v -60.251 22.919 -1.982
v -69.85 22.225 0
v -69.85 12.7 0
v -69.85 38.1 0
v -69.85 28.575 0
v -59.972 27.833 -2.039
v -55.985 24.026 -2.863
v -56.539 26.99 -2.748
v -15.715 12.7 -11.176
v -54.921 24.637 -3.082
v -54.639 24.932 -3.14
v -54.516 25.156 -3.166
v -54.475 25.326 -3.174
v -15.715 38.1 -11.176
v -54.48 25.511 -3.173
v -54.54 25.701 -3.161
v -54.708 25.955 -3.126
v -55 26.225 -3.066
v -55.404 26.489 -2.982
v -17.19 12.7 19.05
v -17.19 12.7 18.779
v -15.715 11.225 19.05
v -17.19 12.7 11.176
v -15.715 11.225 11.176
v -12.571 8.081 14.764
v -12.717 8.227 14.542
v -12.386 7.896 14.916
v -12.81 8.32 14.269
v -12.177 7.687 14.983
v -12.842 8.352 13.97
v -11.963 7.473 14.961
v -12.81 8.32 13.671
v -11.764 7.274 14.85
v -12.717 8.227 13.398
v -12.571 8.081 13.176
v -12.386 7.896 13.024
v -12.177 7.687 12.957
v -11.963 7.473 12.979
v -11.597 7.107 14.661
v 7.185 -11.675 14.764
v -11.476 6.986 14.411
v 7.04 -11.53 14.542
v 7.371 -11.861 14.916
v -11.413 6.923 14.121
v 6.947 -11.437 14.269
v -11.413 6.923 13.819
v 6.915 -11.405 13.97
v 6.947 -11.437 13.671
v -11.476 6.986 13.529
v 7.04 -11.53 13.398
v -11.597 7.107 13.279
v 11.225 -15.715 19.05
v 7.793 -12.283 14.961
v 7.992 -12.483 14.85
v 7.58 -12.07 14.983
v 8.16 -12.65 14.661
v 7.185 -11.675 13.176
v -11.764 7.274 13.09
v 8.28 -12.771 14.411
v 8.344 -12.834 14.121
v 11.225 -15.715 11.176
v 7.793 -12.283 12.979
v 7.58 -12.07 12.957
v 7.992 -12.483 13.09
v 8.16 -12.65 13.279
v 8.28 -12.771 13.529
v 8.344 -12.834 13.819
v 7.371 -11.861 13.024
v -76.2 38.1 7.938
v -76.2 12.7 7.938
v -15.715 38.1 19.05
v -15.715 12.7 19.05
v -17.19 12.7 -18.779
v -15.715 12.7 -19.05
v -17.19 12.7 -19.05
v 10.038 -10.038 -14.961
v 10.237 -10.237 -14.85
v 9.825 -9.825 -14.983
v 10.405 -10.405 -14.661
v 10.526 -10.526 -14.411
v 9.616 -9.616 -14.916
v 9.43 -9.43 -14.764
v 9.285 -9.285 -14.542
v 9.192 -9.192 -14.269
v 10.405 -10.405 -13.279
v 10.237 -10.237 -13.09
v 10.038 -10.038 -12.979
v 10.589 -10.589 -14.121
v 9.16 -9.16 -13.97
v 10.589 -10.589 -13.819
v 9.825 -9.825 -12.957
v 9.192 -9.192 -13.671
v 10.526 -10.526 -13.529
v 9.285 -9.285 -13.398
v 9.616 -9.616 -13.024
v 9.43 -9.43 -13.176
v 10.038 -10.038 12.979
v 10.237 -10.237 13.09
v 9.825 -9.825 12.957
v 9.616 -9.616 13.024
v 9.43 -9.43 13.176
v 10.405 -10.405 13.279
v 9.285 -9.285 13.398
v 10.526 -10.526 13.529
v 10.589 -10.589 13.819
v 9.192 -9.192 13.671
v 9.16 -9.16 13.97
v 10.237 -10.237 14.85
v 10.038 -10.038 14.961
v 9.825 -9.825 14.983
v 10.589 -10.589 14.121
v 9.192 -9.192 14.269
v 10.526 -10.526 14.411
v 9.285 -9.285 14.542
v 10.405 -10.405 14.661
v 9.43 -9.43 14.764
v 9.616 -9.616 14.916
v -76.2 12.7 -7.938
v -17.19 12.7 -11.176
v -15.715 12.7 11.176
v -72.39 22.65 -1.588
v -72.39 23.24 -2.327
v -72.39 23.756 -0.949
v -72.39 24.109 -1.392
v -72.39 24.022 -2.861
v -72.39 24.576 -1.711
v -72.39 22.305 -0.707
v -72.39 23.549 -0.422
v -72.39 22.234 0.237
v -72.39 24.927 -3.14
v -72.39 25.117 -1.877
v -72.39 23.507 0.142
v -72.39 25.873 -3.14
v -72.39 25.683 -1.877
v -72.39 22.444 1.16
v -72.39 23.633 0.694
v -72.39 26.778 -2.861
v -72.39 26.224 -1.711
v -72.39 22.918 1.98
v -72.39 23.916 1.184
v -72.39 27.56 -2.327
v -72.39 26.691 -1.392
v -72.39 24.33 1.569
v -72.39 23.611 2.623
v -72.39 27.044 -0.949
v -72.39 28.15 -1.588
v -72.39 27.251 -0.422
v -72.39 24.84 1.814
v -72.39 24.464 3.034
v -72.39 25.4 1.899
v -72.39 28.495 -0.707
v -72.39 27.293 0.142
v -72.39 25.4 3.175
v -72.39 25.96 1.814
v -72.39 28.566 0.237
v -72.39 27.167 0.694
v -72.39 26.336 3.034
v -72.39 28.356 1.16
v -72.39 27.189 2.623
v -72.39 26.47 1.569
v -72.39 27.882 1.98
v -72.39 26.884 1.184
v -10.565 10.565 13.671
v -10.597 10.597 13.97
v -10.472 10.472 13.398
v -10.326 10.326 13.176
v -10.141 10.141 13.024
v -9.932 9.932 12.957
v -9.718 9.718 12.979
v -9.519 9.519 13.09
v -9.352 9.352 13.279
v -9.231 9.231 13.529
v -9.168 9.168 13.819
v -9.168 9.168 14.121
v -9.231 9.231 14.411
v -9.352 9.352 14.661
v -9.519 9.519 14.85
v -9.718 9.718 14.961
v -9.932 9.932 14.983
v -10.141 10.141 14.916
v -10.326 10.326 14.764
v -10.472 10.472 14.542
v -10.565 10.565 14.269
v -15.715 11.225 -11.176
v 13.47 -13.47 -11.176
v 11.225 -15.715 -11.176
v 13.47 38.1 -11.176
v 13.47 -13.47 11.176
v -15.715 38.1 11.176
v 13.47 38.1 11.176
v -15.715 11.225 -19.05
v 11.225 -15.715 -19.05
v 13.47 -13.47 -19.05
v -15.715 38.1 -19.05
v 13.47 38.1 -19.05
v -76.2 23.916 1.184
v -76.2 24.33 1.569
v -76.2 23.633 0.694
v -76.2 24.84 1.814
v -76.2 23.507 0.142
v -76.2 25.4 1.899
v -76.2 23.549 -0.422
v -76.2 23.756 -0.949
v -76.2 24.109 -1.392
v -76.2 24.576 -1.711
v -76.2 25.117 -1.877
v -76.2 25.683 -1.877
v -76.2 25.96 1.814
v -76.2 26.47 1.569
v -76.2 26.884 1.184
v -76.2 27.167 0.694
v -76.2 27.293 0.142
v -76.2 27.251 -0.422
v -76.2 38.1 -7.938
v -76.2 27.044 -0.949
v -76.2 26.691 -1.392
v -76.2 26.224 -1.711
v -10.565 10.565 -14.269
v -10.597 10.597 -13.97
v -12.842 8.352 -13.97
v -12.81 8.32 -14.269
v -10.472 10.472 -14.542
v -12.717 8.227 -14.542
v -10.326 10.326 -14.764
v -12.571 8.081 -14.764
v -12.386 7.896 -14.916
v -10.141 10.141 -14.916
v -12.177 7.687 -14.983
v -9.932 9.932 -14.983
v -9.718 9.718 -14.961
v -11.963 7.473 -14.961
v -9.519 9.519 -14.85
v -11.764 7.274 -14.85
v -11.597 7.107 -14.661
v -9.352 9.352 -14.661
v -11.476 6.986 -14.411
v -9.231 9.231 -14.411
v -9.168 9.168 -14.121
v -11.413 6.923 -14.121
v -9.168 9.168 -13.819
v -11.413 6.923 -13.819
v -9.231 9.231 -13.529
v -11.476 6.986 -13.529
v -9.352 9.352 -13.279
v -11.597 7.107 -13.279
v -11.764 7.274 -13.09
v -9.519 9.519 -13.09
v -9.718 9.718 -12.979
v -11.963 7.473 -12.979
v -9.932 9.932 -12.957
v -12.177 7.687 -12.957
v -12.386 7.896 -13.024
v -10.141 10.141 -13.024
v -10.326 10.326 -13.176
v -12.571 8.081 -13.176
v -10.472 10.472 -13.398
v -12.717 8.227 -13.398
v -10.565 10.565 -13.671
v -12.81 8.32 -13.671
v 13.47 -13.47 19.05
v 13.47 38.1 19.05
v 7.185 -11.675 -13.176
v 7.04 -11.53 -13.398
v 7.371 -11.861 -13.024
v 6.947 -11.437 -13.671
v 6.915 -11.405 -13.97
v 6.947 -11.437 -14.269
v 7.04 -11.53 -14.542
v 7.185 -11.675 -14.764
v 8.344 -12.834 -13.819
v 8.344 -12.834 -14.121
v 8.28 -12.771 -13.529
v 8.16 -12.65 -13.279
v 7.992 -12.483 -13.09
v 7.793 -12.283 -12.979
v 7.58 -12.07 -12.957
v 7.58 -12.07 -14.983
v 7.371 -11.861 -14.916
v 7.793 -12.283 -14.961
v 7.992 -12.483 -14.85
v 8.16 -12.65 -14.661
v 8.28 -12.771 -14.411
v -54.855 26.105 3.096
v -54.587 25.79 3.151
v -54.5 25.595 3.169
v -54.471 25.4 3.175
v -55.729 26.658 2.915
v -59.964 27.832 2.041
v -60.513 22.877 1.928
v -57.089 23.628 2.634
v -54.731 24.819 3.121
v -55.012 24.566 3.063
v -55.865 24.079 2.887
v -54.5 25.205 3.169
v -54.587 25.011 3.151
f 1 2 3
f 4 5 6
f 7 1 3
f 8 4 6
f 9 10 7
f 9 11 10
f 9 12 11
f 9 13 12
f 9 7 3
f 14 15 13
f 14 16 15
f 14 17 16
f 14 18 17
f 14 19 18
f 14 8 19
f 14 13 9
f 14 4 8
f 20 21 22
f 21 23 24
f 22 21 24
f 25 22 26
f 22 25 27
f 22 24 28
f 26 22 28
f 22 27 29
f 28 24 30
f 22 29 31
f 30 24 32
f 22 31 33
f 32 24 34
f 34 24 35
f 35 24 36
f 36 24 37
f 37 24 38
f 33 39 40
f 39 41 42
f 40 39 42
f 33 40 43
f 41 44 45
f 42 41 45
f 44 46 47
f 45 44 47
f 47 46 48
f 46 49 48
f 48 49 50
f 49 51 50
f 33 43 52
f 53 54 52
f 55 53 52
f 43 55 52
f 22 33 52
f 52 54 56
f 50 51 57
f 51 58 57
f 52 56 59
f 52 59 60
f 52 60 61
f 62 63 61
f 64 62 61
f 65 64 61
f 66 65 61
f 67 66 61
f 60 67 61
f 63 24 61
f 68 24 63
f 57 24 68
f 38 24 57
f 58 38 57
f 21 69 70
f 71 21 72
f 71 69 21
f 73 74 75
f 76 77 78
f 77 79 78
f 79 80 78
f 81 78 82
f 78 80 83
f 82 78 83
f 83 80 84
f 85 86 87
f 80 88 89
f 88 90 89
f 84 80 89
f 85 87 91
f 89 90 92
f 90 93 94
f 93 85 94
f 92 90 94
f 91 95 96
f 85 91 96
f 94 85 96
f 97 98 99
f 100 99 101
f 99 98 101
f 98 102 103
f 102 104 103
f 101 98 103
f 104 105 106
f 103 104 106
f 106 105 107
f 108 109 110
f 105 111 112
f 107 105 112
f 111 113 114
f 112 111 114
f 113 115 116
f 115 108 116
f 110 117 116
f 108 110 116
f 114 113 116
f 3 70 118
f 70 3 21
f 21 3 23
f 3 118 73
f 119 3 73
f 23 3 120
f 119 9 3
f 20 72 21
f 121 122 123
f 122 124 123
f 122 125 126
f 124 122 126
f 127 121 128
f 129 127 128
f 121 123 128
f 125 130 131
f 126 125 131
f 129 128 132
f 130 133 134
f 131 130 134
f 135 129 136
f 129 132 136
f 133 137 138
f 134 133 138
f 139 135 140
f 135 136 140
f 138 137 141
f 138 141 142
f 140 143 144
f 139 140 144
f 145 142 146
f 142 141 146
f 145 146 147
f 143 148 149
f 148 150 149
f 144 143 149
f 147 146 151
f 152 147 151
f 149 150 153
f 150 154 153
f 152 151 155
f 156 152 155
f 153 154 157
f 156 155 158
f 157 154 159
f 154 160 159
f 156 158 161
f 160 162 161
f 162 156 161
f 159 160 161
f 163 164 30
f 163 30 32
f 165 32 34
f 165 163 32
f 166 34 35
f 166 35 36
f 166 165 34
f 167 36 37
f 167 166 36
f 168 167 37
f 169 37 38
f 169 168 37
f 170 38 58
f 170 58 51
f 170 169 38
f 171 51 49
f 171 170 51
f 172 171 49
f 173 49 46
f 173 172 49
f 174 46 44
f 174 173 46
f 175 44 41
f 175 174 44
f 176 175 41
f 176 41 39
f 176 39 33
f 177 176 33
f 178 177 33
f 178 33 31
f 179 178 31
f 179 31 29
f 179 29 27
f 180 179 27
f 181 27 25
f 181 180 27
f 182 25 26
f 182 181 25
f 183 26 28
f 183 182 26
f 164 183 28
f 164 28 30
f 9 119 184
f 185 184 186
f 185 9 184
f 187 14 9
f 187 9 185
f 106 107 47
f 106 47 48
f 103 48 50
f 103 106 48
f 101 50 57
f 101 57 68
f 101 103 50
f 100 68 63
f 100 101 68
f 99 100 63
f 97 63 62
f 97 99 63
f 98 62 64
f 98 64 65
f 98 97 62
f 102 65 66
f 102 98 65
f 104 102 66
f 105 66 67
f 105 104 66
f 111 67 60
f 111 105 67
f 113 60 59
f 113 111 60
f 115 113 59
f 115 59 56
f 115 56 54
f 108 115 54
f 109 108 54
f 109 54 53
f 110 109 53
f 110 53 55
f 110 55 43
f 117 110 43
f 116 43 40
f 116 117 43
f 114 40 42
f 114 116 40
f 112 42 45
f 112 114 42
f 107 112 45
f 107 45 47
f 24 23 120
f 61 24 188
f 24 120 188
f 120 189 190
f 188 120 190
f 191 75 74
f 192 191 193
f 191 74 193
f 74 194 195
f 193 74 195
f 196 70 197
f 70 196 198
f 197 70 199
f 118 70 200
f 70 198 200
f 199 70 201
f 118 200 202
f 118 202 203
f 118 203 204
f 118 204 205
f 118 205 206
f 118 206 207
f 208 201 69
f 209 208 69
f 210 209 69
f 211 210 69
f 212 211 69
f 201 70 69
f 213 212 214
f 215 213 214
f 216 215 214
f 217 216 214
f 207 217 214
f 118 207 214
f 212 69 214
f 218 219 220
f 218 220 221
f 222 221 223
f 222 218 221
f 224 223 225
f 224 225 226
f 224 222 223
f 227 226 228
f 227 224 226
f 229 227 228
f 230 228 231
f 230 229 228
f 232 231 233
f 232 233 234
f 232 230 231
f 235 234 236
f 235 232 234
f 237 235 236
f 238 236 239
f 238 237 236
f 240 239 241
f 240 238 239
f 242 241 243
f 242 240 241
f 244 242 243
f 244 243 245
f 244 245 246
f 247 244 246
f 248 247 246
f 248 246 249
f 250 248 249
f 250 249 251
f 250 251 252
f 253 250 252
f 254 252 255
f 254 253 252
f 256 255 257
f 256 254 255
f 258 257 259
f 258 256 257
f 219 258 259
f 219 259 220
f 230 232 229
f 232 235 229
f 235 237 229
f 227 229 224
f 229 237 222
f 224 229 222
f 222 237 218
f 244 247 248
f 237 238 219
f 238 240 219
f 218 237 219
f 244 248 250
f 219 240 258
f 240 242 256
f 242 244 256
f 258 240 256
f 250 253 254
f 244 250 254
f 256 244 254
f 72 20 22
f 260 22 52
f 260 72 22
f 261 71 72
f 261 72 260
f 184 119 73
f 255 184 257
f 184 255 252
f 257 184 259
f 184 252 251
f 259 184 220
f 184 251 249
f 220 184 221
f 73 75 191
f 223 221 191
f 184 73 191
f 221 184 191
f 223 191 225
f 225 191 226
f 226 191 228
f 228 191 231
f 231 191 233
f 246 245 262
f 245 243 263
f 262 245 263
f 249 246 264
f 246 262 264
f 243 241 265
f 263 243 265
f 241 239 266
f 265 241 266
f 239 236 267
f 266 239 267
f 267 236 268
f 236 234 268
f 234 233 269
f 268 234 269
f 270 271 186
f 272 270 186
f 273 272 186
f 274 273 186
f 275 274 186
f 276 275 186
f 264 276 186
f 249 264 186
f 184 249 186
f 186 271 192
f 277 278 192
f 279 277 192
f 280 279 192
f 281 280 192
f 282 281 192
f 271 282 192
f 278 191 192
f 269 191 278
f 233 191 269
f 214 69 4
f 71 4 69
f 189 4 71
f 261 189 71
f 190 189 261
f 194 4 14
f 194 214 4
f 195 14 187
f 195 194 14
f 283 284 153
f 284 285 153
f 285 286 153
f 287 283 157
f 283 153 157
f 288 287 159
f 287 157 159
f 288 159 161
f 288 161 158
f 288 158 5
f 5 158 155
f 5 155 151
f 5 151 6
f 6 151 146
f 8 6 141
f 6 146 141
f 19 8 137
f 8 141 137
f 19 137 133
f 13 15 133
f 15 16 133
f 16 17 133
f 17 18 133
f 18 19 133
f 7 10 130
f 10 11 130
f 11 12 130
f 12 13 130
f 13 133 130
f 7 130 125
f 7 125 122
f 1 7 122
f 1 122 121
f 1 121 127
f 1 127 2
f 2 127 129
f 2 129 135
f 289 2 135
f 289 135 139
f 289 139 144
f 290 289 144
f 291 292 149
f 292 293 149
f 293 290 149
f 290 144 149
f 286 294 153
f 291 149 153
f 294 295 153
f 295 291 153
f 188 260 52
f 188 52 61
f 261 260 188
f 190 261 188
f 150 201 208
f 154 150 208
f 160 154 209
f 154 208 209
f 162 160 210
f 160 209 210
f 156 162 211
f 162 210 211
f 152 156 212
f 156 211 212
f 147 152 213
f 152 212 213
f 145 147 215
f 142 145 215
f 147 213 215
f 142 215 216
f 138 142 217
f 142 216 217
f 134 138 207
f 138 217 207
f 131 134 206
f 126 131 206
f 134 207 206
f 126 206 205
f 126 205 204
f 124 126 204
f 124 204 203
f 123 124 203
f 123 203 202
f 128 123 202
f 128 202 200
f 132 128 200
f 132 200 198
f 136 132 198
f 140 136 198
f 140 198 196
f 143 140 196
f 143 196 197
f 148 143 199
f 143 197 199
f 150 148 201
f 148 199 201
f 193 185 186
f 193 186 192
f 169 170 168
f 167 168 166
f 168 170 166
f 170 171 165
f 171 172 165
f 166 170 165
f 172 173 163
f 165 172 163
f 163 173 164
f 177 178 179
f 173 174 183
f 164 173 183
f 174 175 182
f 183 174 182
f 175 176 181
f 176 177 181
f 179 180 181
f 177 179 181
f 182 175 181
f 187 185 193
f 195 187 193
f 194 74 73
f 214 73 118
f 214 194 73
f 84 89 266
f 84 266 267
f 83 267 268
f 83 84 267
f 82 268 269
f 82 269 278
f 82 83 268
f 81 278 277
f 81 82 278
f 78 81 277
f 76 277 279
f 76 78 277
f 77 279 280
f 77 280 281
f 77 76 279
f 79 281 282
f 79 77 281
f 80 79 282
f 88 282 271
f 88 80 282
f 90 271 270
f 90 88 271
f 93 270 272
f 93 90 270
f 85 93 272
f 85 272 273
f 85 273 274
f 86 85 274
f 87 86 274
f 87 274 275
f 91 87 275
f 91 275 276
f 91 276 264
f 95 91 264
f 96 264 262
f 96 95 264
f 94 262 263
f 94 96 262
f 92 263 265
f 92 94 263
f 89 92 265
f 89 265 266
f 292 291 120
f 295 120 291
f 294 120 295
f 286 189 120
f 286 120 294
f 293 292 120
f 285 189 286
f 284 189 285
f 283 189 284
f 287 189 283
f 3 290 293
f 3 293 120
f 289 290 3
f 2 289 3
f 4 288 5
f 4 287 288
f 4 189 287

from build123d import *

# Parameters (mm, degrees)
BOSS_EXTRUDE2_START   = -76.2
SKETCH3_W             = 15.875
SKETCH3_H             = 25.4
BOSS_EXTRUDE2_DEPTH   = 6.35
SKETCH4_W             = 38.1
SKETCH4_H             = 7.874
SKETCH4_R             = 1.016
BOSS_EXTRUDE3_DEPTH   = 3.175
BOSS_EXTRUDE3_2_DEPTH = 3.175
BOSS_EXTRUDE4_REACH   = 85.527
BOSS_EXTRUDE5_DEPTH   = 25.4
BOSS_EXTRUDE7_DEPTH   = 25.4
BOSS_EXTRUDE8_START   = -19.05
BOSS_EXTRUDE8_DEPTH   = 7.874
BOSS_EXTRUDE8_START_2 = 11.176
BOSS_EXTRUDE8_2_DEPTH = 7.874
SKETCH9_R             = 1.89865
CUT_EXTRUDE2_DEPTH    = 3.81
SKETCH10_R            = 3.175
CUT_EXTRUDE3_DEPTH    = 96.846325291


with BuildPart() as part:
    # Sketch3 → Boss-Extrude2 (new body)
    with BuildSketch(Plane(origin=(0, 0, 0), x_dir=(0, 0, -1), z_dir=(1, 0, 0)).offset(BOSS_EXTRUDE2_START)):
        with Locations((0, 25.4)):
            Rectangle(SKETCH3_W, SKETCH3_H)
    extrude(amount=BOSS_EXTRUDE2_DEPTH)



with BuildPart() as body_2:
    # Sketch4 → Boss-Extrude3 (new body)
    with BuildSketch(Plane(origin=(0, 0, 0), x_dir=(-0.7071067811865477, 0.7071067811865475, 0), z_dir=(-0.7071067811865475, -0.7071067811865477, 0))):
        with Locations((0, -15.113)):
            Rectangle(SKETCH4_W, SKETCH4_H)
        with Locations((13.97, -13.97)):
            Circle(SKETCH4_R, mode=Mode.SUBTRACT)
        with Locations((-13.97, -13.97)):
            Circle(SKETCH4_R, mode=Mode.SUBTRACT)
    extrude(amount=BOSS_EXTRUDE3_DEPTH)

    # Boss-Extrude4: up to this face of the body (flat: up to its plane)
    boss_extrude4_end = Plane(body_2.part.faces().sort_by_distance((0, 0, 15.13825721))[0])
    # Sketch6 → Boss-Extrude4 (add, up to the picked face)
    with BuildSketch(Plane.XZ.offset(-12.7), mode=Mode.PRIVATE) as boss_extrude4_sk1:
        Polygon((-13.470384182, -19.05), (-15.715448212, -19.05), (-15.715448212, -11.176), (-13.470384182, -11.176), (13.470384182, -11.176), (13.470384182, -19.05), align=None)
    boss_extrude4_tool1 = split(extrude(boss_extrude4_sk1.sketch, amount=BOSS_EXTRUDE4_REACH, mode=Mode.PRIVATE), bisect_by=boss_extrude4_end, keep=Keep.BOTH, mode=Mode.PRIVATE)
    # Sketch6 → Boss-Extrude4 (add, up to the picked face)
    with BuildSketch(Plane.XZ.offset(-12.7), mode=Mode.PRIVATE) as boss_extrude4_sk2:
        Polygon((-13.470384182, 11.176), (-15.715448212, 11.176), (-15.715448212, 19.05), (-13.470384182, 19.05), (13.470384182, 19.05), (13.470384182, 11.176), align=None)
    boss_extrude4_tool2 = split(extrude(boss_extrude4_sk2.sketch, amount=BOSS_EXTRUDE4_REACH, mode=Mode.PRIVATE), bisect_by=boss_extrude4_end, keep=Keep.BOTH, mode=Mode.PRIVATE)


with BuildPart() as body_3:
    # Sketch4 → Boss-Extrude3 2 (new body)
    with BuildSketch(Plane(origin=(0, 0, 0), x_dir=(-0.7071067811865477, 0.7071067811865475, 0), z_dir=(-0.7071067811865475, -0.7071067811865477, 0))):
        with Locations((0, 15.113)):
            Rectangle(SKETCH4_W, SKETCH4_H)
        with Locations((13.97, 13.97)):
            Circle(SKETCH4_R, mode=Mode.SUBTRACT)
        with Locations((-13.97, 13.97)):
            Circle(SKETCH4_R, mode=Mode.SUBTRACT)
    extrude(amount=BOSS_EXTRUDE3_2_DEPTH)


with BuildPart() as body_2_1:
    add(body_2.part)

    add(body_3.part)  # Boss-Extrude4 merges body 3
    add(boss_extrude4_tool1.solids().sort_by(Axis((-1.122532, 12.7, -15.113), (0, -1, 0)))[0])
    add(boss_extrude4_tool2.solids().sort_by(Axis((-1.122532, 12.7, 15.113), (0, -1, 0)))[0])

    # Sketch6<2> → Boss-Extrude5 (add)
    with BuildSketch(Plane.XZ.offset(-12.7)):
        Polygon((-13.470384182, -19.05), (-15.715448212, -19.05), (-15.715448212, -11.176), (-13.470384182, -11.176), (13.470384182, -11.176), (13.470384182, -19.05), align=None)
        Polygon((-13.470384182, 11.176), (-15.715448212, 11.176), (-15.715448212, 19.05), (-13.470384182, 19.05), (13.470384182, 19.05), (13.470384182, 11.176), align=None)
    extrude(amount=-BOSS_EXTRUDE5_DEPTH)


with BuildPart() as part_1:
    add(part.part)

    add(body_2_1.part)  # Boss-Extrude7 merges body 2
    # Sketch7 → Boss-Extrude7 (add)
    with BuildSketch(Plane(origin=(0, 38.1, 0), x_dir=(1, 0, 0), z_dir=(0, 1, 0))):
        Polygon((-15.715448212, 19.05), (-76.2, 7.9375), (-76.2, -7.9375), (-15.715448212, -19.05), (-15.715448212, -11.176), (-69.85, 0), (-15.715448212, 11.176), align=None)
    extrude(amount=-BOSS_EXTRUDE7_DEPTH)

    # Boss-Extrude8: read off the stored shape, not the designer's step
    # Boss-Extrude8 outline → Boss-Extrude8 (add)
    with BuildSketch(Plane.XY.offset(BOSS_EXTRUDE8_START)):
        Polygon((-14.240768363, 12.7), (-17.190128061, 12.7), (-15.715448212, 11.225320151), align=None)
    extrude(amount=BOSS_EXTRUDE8_DEPTH)

    # Boss-Extrude8 2 outline → Boss-Extrude8 2 (add)
    with BuildSketch(Plane.XY.offset(BOSS_EXTRUDE8_START_2)):
        Polygon((-14.240768363, 12.7), (-17.190128061, 12.7), (-15.715448212, 11.225320151), align=None)
    extrude(amount=BOSS_EXTRUDE8_2_DEPTH)

    # Sketch9 → Cut-Extrude2 (cut)
    with BuildSketch(Plane.ZY.offset(76.2)):
        with Locations((0, 25.4)):
            Circle(SKETCH9_R)
    extrude(amount=-CUT_EXTRUDE2_DEPTH, mode=Mode.SUBTRACT)

    # Sketch10 → Cut-Extrude3 (cut, through all)
    with BuildSketch(Plane.ZY.offset(72.39)):
        with Locations((0, 25.4)):
            Circle(SKETCH10_R)
    extrude(amount=-CUT_EXTRUDE3_DEPTH, mode=Mode.SUBTRACT)


solid = part_1.part
